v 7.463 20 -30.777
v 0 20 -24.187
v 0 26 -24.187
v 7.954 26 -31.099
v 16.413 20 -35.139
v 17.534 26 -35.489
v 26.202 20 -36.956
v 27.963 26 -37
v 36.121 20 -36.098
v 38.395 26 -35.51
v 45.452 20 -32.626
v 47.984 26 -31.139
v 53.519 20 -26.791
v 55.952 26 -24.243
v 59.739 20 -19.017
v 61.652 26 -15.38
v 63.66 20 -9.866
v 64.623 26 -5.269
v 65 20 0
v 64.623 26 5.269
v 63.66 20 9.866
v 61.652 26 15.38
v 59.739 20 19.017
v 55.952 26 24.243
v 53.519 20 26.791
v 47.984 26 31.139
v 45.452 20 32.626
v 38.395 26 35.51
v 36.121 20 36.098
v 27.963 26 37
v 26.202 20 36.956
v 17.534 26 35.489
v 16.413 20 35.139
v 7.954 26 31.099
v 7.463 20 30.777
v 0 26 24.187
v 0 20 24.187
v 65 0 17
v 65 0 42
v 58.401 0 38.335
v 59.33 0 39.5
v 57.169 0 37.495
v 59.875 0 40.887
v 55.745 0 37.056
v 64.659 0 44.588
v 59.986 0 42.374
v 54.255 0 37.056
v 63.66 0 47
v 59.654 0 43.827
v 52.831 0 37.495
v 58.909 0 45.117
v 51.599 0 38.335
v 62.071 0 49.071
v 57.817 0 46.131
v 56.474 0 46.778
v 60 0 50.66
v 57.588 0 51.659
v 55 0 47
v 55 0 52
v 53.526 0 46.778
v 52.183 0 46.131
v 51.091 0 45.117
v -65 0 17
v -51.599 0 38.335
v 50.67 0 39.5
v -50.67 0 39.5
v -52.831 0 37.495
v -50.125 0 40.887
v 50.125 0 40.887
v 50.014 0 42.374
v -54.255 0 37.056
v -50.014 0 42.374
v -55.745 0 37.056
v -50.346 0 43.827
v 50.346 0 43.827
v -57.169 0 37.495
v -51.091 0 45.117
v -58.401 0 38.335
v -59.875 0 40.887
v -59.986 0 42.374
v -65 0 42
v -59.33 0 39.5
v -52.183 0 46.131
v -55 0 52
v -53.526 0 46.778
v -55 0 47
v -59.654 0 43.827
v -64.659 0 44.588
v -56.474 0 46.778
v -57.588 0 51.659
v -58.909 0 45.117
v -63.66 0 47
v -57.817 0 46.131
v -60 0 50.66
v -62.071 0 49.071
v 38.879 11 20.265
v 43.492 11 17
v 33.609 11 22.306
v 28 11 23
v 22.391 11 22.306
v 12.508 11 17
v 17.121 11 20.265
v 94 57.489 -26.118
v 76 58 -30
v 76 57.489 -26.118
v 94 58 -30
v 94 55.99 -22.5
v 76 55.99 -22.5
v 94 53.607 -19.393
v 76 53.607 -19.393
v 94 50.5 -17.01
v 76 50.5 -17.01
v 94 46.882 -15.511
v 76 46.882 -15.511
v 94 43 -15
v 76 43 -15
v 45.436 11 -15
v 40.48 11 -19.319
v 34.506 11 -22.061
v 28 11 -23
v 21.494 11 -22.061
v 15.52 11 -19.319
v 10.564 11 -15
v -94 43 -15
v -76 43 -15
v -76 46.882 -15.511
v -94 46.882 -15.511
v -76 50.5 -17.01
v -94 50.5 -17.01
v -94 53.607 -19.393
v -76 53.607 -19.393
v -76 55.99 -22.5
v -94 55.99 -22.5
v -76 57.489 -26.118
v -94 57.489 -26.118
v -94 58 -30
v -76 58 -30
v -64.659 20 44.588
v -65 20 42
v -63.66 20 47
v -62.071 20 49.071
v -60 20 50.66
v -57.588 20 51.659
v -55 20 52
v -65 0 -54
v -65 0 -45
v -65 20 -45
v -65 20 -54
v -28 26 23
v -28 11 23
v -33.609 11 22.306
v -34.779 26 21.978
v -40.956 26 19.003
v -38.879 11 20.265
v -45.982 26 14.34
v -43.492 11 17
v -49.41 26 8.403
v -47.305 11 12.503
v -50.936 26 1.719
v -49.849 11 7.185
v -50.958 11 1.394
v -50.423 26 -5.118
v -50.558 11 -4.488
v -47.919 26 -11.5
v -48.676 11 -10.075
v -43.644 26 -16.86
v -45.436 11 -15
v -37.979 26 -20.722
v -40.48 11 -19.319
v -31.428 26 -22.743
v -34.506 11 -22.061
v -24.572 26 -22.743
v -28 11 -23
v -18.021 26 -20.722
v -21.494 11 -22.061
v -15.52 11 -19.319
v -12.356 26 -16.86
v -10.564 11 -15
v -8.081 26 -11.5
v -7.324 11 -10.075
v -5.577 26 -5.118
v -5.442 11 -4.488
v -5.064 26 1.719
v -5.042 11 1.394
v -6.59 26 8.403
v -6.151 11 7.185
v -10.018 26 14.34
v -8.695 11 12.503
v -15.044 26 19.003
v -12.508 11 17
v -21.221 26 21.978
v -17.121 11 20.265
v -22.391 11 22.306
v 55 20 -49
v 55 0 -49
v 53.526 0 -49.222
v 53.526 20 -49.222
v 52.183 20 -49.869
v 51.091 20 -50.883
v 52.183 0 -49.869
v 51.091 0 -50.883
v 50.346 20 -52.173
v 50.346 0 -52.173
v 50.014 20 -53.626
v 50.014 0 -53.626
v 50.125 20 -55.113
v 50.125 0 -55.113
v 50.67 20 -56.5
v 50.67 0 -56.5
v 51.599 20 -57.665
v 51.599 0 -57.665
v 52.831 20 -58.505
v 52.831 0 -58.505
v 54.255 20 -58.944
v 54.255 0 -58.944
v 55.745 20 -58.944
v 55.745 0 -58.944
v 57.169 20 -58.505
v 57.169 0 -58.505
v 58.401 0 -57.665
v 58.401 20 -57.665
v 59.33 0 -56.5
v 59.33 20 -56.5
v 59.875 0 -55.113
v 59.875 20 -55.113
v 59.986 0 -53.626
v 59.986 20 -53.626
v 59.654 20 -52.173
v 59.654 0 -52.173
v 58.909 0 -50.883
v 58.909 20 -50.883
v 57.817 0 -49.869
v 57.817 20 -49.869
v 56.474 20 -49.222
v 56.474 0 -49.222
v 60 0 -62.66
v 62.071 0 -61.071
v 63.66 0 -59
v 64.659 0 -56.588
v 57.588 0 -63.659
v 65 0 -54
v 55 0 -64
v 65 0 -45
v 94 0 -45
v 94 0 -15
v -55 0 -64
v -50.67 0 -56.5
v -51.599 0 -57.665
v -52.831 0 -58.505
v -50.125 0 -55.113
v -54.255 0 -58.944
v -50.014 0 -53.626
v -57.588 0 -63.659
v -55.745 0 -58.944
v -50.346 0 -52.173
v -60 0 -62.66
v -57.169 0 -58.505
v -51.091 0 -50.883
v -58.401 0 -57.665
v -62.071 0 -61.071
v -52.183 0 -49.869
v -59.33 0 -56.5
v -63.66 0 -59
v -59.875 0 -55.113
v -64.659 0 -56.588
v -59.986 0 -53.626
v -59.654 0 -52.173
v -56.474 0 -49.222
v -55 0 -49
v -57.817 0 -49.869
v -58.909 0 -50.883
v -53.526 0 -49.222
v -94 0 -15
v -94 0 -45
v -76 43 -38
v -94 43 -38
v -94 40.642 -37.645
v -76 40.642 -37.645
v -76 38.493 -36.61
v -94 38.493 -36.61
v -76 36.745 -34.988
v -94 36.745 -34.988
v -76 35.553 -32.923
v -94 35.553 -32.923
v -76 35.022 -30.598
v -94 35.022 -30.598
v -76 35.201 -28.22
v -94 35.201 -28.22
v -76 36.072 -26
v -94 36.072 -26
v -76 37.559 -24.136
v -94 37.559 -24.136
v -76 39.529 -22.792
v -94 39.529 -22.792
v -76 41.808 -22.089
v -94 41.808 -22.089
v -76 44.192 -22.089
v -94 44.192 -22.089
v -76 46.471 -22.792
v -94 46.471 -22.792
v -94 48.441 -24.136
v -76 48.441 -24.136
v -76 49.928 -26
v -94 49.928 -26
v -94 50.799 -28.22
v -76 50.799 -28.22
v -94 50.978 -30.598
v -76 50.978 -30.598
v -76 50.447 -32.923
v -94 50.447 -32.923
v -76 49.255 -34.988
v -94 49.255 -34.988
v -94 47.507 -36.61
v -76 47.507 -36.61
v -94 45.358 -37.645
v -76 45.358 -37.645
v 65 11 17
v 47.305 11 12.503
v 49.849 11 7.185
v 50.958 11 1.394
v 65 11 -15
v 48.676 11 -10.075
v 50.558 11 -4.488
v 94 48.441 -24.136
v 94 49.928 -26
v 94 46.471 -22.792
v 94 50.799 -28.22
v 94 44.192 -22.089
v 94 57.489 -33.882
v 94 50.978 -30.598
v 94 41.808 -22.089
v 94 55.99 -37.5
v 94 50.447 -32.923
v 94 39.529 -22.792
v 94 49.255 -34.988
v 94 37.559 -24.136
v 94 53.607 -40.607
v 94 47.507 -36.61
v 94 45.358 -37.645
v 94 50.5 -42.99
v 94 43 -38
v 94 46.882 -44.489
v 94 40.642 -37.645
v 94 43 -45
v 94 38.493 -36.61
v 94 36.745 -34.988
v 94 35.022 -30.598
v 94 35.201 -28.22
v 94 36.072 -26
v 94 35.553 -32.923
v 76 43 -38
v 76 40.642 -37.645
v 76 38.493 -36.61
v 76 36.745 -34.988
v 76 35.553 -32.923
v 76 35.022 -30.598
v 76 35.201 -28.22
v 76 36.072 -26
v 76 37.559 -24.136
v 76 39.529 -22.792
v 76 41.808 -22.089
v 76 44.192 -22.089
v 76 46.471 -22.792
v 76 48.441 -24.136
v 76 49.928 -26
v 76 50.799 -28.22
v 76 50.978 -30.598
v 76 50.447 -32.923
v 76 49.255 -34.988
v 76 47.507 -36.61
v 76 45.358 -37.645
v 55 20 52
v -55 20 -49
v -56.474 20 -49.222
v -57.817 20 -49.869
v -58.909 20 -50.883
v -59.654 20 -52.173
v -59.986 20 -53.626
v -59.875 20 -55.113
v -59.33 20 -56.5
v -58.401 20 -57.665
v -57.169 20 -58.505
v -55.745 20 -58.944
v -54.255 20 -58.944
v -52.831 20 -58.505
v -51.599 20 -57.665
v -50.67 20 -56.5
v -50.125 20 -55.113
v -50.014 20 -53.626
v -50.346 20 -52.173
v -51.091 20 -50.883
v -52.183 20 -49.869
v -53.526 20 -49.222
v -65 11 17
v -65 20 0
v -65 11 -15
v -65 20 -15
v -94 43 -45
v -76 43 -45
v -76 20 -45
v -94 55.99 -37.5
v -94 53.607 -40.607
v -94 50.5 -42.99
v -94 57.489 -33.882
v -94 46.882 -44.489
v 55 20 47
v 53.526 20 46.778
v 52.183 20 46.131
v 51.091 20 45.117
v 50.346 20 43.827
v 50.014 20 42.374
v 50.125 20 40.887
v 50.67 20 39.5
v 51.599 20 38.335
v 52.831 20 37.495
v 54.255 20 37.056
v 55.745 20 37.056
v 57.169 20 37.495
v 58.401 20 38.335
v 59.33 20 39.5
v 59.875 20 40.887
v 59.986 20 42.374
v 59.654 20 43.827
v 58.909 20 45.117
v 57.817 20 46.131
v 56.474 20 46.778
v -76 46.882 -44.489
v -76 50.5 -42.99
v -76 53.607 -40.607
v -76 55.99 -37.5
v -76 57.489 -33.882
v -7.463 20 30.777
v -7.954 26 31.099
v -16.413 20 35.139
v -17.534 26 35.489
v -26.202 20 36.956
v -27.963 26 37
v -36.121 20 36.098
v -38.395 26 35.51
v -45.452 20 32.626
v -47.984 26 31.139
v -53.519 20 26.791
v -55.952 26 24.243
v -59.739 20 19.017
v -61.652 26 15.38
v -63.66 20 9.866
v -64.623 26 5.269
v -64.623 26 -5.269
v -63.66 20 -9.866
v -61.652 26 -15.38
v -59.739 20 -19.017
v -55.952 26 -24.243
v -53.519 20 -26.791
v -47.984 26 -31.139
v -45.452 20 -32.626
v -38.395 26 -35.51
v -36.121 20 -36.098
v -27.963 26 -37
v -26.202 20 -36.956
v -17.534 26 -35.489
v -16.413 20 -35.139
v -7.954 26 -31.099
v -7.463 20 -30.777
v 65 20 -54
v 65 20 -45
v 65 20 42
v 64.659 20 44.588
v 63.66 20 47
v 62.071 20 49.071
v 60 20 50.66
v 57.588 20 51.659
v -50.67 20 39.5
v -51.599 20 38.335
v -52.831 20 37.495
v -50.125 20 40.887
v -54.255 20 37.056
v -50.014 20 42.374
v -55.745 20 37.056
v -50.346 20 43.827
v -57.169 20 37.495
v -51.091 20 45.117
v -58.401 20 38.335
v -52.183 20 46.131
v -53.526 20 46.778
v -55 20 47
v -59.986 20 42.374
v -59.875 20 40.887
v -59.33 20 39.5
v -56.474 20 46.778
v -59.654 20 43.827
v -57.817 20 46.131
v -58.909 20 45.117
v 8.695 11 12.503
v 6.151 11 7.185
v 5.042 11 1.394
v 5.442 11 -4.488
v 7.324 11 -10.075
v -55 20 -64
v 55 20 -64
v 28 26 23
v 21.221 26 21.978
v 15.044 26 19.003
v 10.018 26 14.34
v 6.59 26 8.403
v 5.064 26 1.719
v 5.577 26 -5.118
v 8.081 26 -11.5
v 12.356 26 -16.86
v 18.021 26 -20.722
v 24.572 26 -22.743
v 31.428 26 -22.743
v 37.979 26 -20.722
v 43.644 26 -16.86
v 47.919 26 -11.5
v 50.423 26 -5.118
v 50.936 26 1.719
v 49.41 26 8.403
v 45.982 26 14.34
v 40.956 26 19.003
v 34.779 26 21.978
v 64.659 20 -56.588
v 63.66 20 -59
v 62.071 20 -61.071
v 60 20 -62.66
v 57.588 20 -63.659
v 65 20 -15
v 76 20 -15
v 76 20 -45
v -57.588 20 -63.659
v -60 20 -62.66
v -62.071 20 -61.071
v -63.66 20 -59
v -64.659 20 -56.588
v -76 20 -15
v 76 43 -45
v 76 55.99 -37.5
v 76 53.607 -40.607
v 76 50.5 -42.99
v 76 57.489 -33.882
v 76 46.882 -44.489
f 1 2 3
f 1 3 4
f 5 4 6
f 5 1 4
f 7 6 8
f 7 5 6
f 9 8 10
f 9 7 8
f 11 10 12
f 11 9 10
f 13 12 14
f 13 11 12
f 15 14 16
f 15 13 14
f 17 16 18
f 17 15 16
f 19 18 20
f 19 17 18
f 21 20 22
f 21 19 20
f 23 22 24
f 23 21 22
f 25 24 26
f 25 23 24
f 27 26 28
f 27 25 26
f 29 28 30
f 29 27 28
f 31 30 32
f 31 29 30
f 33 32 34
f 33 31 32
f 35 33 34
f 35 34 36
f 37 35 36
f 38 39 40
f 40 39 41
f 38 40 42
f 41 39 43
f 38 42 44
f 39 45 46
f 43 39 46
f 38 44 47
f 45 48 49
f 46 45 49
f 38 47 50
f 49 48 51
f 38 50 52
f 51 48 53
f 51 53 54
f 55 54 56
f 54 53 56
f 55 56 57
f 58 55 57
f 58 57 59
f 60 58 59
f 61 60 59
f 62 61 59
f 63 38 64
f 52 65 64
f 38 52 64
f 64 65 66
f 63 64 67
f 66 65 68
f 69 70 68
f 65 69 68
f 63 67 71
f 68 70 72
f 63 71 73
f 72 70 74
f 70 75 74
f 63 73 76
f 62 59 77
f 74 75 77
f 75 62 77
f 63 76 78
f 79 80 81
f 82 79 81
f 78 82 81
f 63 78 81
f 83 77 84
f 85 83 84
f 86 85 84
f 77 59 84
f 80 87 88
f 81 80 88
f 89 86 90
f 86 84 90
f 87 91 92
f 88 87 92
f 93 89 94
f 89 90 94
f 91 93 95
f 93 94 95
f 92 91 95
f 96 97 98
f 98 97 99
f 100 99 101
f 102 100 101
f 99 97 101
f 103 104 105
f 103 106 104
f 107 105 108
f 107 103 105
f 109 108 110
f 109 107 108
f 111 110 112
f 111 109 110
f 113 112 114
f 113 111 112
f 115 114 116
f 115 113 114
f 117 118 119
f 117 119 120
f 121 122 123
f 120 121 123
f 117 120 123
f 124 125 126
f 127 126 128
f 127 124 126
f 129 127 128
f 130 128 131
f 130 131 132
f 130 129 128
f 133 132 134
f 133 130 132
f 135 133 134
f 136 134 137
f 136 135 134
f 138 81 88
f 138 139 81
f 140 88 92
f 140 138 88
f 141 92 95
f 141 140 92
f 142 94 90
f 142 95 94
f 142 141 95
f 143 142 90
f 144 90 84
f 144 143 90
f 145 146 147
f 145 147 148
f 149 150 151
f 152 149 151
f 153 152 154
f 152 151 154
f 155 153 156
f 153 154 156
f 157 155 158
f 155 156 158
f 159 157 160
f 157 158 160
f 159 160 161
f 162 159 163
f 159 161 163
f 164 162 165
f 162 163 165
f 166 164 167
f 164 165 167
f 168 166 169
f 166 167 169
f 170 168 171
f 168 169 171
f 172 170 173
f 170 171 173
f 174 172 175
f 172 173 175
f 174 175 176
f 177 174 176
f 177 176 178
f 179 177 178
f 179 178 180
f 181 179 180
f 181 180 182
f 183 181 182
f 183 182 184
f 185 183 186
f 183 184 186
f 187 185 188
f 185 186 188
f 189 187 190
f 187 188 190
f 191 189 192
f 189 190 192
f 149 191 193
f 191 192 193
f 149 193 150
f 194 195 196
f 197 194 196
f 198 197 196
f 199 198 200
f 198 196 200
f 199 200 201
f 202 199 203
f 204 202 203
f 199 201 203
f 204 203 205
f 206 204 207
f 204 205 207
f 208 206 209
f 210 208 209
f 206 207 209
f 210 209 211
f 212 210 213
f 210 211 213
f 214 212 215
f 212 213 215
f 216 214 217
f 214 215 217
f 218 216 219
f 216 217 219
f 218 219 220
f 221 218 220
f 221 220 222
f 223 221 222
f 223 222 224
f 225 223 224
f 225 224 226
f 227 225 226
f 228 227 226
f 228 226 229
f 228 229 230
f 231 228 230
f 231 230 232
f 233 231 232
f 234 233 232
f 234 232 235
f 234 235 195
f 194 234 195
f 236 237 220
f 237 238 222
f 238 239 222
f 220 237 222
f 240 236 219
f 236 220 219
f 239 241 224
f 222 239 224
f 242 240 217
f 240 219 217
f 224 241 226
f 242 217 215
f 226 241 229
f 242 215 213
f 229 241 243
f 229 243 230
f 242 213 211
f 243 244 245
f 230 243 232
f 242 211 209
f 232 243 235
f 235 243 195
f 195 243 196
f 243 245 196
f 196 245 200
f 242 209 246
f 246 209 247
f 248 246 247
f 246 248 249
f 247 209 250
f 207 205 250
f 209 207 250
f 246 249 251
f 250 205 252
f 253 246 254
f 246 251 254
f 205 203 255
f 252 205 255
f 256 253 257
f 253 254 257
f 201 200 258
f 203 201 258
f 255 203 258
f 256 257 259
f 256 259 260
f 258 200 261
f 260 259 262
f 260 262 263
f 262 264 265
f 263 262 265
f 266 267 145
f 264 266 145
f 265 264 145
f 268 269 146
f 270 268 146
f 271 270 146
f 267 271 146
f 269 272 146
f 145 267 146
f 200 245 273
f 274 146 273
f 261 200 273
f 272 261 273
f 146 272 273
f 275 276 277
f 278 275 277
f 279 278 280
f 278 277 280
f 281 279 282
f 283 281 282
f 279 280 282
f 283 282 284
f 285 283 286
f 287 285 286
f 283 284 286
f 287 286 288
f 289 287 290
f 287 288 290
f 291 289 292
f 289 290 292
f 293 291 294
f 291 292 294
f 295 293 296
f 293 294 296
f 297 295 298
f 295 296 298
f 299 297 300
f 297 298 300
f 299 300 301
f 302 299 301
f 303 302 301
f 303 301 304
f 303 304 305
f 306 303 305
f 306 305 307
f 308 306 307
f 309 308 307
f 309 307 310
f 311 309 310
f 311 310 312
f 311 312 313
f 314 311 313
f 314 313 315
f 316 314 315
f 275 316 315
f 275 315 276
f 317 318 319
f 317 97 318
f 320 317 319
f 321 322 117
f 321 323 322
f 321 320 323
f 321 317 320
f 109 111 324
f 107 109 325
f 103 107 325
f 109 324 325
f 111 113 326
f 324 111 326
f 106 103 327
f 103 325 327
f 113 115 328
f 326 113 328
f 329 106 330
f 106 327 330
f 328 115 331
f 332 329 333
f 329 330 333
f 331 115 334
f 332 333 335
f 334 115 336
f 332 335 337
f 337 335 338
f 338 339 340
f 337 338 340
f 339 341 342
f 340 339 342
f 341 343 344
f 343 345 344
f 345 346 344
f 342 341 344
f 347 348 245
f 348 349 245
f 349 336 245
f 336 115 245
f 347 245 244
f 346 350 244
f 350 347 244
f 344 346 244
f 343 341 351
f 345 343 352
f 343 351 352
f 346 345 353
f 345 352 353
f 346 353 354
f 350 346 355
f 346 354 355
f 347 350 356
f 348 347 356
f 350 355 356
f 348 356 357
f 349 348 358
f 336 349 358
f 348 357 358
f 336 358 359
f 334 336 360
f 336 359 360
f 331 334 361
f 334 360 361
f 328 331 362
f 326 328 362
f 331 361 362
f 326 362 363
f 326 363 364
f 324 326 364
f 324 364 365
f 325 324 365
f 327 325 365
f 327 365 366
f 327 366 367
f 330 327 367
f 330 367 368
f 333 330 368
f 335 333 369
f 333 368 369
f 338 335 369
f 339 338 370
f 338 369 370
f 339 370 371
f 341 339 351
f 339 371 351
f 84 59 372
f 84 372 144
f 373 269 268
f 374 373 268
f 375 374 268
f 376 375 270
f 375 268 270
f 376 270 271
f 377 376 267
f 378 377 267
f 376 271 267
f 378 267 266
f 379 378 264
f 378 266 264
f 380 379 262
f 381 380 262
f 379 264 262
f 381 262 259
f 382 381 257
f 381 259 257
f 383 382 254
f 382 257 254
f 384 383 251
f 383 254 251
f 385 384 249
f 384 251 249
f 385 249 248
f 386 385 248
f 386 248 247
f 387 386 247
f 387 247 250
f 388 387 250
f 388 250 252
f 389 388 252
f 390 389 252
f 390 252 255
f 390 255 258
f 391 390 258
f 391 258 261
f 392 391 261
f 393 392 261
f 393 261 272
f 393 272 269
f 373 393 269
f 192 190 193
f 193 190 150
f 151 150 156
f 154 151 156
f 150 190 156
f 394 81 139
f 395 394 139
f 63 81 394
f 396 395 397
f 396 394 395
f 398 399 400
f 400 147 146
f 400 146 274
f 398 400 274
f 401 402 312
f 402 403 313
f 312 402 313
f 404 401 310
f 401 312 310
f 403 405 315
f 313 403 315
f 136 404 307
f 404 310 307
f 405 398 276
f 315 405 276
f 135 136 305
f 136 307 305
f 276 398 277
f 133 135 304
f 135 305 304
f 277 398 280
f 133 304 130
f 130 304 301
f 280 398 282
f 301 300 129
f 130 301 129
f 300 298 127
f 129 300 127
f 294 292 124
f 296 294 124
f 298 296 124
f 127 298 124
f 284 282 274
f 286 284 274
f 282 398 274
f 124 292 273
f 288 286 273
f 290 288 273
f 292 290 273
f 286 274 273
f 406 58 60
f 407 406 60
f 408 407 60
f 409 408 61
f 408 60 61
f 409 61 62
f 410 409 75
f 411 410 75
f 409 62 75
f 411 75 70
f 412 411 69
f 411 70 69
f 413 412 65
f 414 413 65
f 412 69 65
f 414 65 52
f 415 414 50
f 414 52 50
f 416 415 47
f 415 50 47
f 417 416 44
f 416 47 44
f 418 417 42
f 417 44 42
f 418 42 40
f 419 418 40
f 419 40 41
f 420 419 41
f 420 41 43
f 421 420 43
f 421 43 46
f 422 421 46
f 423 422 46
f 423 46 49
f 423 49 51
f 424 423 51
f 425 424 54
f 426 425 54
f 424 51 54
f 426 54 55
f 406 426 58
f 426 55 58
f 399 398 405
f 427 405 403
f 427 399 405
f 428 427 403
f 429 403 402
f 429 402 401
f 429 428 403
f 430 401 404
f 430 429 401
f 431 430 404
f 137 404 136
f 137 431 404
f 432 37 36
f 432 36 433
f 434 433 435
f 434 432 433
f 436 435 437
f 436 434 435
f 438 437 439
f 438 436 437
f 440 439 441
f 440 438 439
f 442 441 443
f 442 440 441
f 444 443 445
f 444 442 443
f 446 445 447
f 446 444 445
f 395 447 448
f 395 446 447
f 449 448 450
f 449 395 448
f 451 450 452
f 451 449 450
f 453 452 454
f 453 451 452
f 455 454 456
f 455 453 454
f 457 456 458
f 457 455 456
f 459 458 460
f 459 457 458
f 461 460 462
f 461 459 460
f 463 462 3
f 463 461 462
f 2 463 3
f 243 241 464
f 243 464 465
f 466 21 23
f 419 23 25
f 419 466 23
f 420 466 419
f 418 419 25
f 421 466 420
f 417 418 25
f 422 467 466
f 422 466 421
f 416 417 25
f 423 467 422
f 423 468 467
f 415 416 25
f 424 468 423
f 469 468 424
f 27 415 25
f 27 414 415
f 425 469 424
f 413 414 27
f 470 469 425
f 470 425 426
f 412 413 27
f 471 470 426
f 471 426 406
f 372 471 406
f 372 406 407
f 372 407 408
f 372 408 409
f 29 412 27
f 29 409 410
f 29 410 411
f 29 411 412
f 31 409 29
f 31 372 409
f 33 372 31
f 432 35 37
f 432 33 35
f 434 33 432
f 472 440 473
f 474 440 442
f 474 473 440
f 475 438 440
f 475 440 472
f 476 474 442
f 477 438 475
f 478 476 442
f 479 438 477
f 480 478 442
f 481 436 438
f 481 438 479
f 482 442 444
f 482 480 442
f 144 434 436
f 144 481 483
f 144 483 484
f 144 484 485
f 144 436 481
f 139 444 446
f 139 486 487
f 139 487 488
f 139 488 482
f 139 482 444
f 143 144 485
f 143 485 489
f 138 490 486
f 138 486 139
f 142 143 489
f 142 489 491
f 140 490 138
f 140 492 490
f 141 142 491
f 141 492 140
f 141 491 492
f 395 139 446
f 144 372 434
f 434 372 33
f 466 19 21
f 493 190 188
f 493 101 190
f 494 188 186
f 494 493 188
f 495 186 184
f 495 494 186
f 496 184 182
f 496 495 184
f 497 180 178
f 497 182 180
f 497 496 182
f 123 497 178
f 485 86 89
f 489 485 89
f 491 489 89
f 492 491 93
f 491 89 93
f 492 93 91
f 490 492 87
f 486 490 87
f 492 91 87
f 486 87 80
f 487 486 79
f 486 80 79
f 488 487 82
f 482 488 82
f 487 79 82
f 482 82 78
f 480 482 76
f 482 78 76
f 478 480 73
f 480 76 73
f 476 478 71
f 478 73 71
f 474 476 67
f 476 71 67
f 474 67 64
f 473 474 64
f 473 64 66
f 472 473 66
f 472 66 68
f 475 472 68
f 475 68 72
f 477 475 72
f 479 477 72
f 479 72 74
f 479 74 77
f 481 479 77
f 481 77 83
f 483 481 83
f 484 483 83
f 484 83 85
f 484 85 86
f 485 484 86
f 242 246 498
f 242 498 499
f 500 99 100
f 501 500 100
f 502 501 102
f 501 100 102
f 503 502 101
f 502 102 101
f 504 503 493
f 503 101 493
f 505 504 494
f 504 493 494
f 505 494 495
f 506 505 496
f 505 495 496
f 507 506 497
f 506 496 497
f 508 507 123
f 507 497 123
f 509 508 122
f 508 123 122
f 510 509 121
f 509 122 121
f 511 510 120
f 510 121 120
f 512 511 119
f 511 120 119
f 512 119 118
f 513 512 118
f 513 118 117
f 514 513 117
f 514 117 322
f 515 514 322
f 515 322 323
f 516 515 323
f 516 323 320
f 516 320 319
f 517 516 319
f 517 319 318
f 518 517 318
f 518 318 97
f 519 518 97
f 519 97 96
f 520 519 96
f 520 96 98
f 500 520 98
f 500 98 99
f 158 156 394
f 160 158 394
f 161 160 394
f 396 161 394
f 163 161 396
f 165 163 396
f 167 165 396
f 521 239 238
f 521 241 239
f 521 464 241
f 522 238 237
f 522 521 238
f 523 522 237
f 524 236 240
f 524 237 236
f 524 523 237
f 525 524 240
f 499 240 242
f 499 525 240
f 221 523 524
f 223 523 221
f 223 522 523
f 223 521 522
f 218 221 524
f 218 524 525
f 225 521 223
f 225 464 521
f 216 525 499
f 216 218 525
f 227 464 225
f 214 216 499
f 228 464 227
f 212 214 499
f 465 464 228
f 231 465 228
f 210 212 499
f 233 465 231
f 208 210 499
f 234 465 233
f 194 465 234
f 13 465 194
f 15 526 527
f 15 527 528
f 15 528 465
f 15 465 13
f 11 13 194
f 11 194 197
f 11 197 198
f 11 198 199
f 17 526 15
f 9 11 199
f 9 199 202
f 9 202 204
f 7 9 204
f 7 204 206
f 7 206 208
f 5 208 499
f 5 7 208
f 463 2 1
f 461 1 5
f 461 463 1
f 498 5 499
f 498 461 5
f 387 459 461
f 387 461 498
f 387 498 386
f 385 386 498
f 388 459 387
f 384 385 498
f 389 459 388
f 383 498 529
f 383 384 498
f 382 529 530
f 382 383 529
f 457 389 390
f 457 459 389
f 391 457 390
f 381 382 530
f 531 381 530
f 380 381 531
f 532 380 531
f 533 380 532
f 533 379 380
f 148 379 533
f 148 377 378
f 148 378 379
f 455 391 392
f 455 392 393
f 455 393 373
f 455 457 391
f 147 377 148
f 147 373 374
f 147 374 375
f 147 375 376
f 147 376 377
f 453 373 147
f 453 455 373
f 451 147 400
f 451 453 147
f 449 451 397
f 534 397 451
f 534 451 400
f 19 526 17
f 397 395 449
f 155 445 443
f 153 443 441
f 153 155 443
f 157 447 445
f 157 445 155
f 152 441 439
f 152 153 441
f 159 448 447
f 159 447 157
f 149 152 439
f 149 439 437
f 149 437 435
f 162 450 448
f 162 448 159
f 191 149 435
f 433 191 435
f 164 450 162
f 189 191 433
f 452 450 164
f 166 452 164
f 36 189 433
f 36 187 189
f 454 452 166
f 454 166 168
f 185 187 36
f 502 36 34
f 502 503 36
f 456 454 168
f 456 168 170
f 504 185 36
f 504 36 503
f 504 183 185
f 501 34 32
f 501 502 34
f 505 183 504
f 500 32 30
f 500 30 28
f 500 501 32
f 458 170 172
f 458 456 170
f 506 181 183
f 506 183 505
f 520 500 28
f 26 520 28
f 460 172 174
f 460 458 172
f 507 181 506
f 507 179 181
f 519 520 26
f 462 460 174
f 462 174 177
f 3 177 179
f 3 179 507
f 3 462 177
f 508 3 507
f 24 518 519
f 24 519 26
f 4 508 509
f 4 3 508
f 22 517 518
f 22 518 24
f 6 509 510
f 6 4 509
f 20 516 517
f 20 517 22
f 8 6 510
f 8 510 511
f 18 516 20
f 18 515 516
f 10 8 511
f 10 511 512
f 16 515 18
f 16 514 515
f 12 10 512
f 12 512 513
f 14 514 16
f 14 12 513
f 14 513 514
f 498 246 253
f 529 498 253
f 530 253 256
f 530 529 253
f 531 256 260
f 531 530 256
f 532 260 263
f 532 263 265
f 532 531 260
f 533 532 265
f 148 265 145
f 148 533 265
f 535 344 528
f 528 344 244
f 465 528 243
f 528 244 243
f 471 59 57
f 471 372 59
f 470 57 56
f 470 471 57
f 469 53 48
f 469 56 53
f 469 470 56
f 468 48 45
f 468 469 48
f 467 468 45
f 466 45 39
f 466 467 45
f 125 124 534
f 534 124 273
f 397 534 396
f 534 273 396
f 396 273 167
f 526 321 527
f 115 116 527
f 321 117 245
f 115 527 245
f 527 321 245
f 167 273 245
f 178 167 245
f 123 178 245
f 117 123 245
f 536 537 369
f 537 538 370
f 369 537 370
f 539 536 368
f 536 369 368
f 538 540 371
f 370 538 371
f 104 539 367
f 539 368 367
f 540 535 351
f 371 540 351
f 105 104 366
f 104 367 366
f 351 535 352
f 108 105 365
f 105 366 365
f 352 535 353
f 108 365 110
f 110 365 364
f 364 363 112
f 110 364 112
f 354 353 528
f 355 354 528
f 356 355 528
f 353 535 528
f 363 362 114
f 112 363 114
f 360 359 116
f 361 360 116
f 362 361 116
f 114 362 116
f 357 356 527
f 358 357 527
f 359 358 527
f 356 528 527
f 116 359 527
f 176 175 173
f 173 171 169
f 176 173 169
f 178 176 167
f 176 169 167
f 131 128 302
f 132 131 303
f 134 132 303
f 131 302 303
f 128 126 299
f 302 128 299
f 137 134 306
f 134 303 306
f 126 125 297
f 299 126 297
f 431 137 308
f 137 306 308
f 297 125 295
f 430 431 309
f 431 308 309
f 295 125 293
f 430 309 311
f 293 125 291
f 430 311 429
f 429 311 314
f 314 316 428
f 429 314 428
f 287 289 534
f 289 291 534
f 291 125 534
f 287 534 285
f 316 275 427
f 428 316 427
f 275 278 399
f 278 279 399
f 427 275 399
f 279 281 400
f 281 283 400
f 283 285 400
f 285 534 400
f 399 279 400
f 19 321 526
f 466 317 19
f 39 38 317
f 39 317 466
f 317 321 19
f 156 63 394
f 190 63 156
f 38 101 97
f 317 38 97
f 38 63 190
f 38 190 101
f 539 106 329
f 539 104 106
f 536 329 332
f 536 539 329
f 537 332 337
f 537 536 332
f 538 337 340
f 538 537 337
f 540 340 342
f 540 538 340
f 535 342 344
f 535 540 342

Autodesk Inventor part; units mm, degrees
ref_plane "YZ Plane" through (0, 0, 0) normal (1, 0, 0) x (0, 1, 0)
ref_plane "XZ Plane" through (0, 0, 0) normal (0, 1, 0) x (-1, 0, 0)
ref_plane "XY Plane" through (0, 0, 0) normal (0, 0, 1) x (1, 0, 0)
sketch "Sketch1" plane through (0, 0, 0) normal (0, 1, 0) x (-1, 0, 0)
  line L0 (65, -64) -> (-65, -64)
  line L1 (-65, -64) -> (-65, -45)
  line L2 (-65, 52) -> (65, 52)
  line L3 (65, 52) -> (65, -15)
  line L4 (94, -45) -> (65, -45)
  line L5 (65, -45) -> (65, -15) construction
  line L6 (65, -15) -> (94, -15)
  line L7 (94, -15) -> (94, -45)
  line L8 (-65, -45) -> (-94, -45)
  line L9 (-94, -45) -> (-94, -15)
  line L10 (-94, -15) -> (-65, -15)
  line L11 (-65, -15) -> (-65, -30) construction
  line L12 (94, -30) -> (-94, -30) construction
  line L13 (65, -45) -> (65, -64)
  line L14 (65, -15) -> (65, -45) construction
  line L15 (-65, -45) -> (-65, -15) construction
  line L16 (-65, -30) -> (-65, -45) construction
  line L17 (-65, -15) -> (-65, 52)
  point P0 (0, 0)
  point P1 (0, 52)
  dimension "d0" = 116
  dimension "d1" = 130
  dimension "d2" = 52
  dimension "d3" = 30
  dimension "d4" = 30
  dimension "d5" = 188
extrude "Extrusion1" add sketch "Sketch1" along normal blind 20
fillet "Fillet1" radius 10 4 edges at (65, 10, 52) (-65, 10, 52) (-65, 10, -64) (65, 10, -64)
sketch "Sketch2" plane through (0, 20, 0) normal (0, 1, 0) x (1, 0, 0)
  line L0 (65, 15) -> (94, 15) projected
  line L1 (94, 15) -> (94, 45) projected
  line L2 (94, 45) -> (65, 45) projected
  line L3 (94, 15) -> (94, 45) projected
  line L4 (65, 15) -> (94, 15) projected
  line L5 (94, 45) -> (76, 45)
  line L6 (76, 45) -> (76, 15)
  line L7 (76, 15) -> (94, 15)
  line L8 (94, 15) -> (94, 45)
  point P0 (0, 0)
  dimension "d9" = 18
extrude "Extrusion2" add sketch "Sketch2" along normal blind 38
fillet "Fillet2" radius 15 2 edges at (85, 58, -15) (85, 58, -45)
mirror "Mirror1" about plane through (0, 0, 0) normal (1, 0, 0) of "Extrusion2", "Fillet2"
sketch "Sketch3" plane through (94, 0, -15) normal (1, 0, 0) x (0, 0, -1)
  arc A0 (30, 43) -> (0, 43) centre (15, 43) ccw projected
  point P0 (-15, 0)
hole "Hole1" at (94, 43, -30) direction (-1, 0, 0) diameter 16 end through all
sketch "Sketch4" plane through (0, 20, 0) normal (0, 1, 0) x (1, 0, 0)
  line L0 (-55, -52) -> (55, -52) projected
  arc A0 (0, 24.1868) -> (0, -24.1868) centre (-28, 0) ccw
  line L1 (55, 64) -> (-55, 64) projected
  line L2 (0, 64) -> (0, -52) construction
  arc A1 (0, -24.1868) -> (0, 24.1868) centre (28, 0) ccw
  point P0 (0, 0)
  dimension "d20" = 74
  dimension "d21" = 56
extrude "Extrusion3" add sketch "Sketch4" along normal blind 6
sketch "Sketch5" plane through (0, 26, 0) normal (0, 1, 0) x (1, 0, 0)
  arc A0 (0, 24.1868) -> (0, -24.1868) centre (-28, 0) ccw projected
  point P0 (0, 0)
hole "Hole2" at (-28, 26, 0) direction (0, -1, 0) diameter 46 depth 15
sketch "Sketch6" plane through (0, 26, 0) normal (0, 1, 0) x (1, 0, 0)
  arc A0 (0, -24.1868) -> (0, 24.1868) centre (28, 0) ccw projected
  point P0 (0, 0)
  point P1 (28, 0)
hole "Hole3" at (28, 26, 0) direction (0, -1, 0) diameter 46 depth 15
sketch "Sketch7" plane through (65, 0, -15) normal (1, 0, 0) x (0, 0, -1)
  line L0 (-57, 0) -> (0, 0) projected
  line L1 (0, 0) -> (0, 20) projected
  line L2 (0, 0) -> (-32, 0)
  line L3 (-32, 0) -> (-32, 11)
  line L4 (-32, 11) -> (0, 11)
  line L5 (0, 11) -> (0, 0)
  point P0 (-15, 0)
  point P1 (0, 11)
  dimension "d38" = 32
  dimension "d39" = 11
extrude "Extrusion4" cut sketch "Sketch7" against normal through all
sketch "Sketch8" plane through (0, 20, 0) normal (0, 1, 0) x (1, 0, 0)
  arc A0 (65, 54) -> (55, 64) centre (55, 54) ccw projected
  arc A1 (-55, 64) -> (-65, 54) centre (-55, 54) ccw projected
  arc A2 (-65, 0) -> (0, -24.1868) centre (-28, 0) ccw projected
  line L0 (-65, 0) -> (-65, -42) projected
  arc A3 (-65, -42) -> (-55, -52) centre (-55, -42) ccw projected
  line L1 (-55, -52) -> (55, -52) projected
  arc A4 (55, -52) -> (65, -42) centre (55, -42) ccw projected
  line L2 (65, -42) -> (65, 0) projected
  arc A5 (0, -24.1868) -> (65, 0) centre (28, 0) ccw projected
  point P0 (0, 0)
hole "Hole4" at (-55, 20, -54) at (55, 20, -54) at (55, 20, 42) at (-55, 20, 42) direction (0, -1, 0) diameter 10 end through all
properties part number "Part023. Cylinder head" material "Steel, Carbon"
